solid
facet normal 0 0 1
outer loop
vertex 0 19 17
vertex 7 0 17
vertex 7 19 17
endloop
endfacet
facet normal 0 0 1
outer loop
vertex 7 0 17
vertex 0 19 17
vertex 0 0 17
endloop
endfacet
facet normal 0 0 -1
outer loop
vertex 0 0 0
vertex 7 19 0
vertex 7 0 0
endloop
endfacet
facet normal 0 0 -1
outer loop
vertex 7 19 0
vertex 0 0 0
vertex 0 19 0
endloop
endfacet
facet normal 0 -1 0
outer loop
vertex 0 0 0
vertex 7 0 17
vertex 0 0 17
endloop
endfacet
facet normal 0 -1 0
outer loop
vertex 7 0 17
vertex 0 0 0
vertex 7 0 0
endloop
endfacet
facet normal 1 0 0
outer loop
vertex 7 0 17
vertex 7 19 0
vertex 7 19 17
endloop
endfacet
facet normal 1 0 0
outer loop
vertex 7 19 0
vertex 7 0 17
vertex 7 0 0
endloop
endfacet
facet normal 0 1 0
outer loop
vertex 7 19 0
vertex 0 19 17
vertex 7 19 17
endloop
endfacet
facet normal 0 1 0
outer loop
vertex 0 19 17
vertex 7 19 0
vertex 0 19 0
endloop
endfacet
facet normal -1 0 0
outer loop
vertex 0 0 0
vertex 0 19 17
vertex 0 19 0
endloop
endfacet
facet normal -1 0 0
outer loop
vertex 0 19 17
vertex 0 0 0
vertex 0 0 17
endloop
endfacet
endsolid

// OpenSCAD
// Generated by SolidPython 1.0.1 on 2020-07-29 00:46:55


cube(size = [7, 19, 17]);
/***********************************************
*********      SolidPython code:      **********
************************************************
 
# import packages: SolidPython
from solid import *
from solid.utils import *
from itertools import chain, combinations, permutations


class Resize:

    def __init__(self, scad_file):
        self.scad_file = scad_file
        #self.scad_file = import_scad(scad_file)
        # cone/cylinder param:
        self.r1 = 0
        self.r2 = 0
        self.h = 0
        # rectangular prism param:
        self.w = 0
        self.l = 0
        # ellipse param:
        self.r = 0

    # import OpenScad code (file name corresponds to shape)


    # classify shape + parameters
    def assign(self, param1, param2, param3):
        if self.scad_file == 'cone.scad':
            self.r1 = param1
            self.r2 = param2
            self.h = param3
        elif self.scad_file == 'cylinder.scad':
            self.r1 = param1
            self.r2 = param2
            self.h = param3
        elif self.scad_file == 'rectangularPrism.scad':
            self.h = param1
            self.l = param2
            self.w = param3
        else:
            self.r = param1
            self.h = param2

    # resize parameters
    def iterate(self):
        x = range(3, 20, 2)
        i = 1
        if self.scad_file == 'cone.scad':
            tempList = list(permutations(x, 2))
            for temp in tempList:
                param1 = temp[0]
                param2 = temp[1]
                filepath = 'produced_scad_files/' + 'cone' + str(param1) + '_' + str(param2) + '_' + '.scad'
                scad_render_to_file(cylinder(h=param1, r1=param2, r2=0), filepath)

        elif self.scad_file == 'cylinder.scad':
            tempList = list(permutations(x, 3))
            for temp in tempList:
                param1 = temp[0]
                param2 = temp[1]
                filepath = 'produced_scad_files/' + 'cylinder' + str(param1) + '_' + str(param2) + '_' + '.scad'
                scad_render_to_file(cylinder(h=param1, r1=param2, r2=param2), filepath)

        elif self.scad_file == 'rectangularPrism.scad':
            tempList = list(permutations(x, 3))
            for temp in tempList:
                param1 = temp[0]
                param2 = temp[1]
                param3 = temp[2]
                filepath = 'produced_scad_files/' + 'rectangularPrism' + str(param1) + '_' + str(param2) + '_' + str(
                    param3) + '.scad'
                scad_render_to_file(cube(size=(param1, param2, param3)), filepath)

        elif self.scad_file == 'ellipse.scad':
            tempList = list(permutations(x, 4))
            for temp in tempList:
                param1 = temp[0]
                param2 = temp[1]
                param3 = temp[2]
                param4 = temp[3]
                filepath = 'produced_scad_files/' + 'ellipse' + str(param1) + '_' + str(param2) + '_' + str(param3) + '_' + str(param4) + '.scad'
                scad_render_to_file(scale([param1, param2, param3])(sphere(r=param4)), filepath)

    def render_to_scadfile(self):
        scad_render_to_file(scad, 'example.scad') 
 
************************************************/
